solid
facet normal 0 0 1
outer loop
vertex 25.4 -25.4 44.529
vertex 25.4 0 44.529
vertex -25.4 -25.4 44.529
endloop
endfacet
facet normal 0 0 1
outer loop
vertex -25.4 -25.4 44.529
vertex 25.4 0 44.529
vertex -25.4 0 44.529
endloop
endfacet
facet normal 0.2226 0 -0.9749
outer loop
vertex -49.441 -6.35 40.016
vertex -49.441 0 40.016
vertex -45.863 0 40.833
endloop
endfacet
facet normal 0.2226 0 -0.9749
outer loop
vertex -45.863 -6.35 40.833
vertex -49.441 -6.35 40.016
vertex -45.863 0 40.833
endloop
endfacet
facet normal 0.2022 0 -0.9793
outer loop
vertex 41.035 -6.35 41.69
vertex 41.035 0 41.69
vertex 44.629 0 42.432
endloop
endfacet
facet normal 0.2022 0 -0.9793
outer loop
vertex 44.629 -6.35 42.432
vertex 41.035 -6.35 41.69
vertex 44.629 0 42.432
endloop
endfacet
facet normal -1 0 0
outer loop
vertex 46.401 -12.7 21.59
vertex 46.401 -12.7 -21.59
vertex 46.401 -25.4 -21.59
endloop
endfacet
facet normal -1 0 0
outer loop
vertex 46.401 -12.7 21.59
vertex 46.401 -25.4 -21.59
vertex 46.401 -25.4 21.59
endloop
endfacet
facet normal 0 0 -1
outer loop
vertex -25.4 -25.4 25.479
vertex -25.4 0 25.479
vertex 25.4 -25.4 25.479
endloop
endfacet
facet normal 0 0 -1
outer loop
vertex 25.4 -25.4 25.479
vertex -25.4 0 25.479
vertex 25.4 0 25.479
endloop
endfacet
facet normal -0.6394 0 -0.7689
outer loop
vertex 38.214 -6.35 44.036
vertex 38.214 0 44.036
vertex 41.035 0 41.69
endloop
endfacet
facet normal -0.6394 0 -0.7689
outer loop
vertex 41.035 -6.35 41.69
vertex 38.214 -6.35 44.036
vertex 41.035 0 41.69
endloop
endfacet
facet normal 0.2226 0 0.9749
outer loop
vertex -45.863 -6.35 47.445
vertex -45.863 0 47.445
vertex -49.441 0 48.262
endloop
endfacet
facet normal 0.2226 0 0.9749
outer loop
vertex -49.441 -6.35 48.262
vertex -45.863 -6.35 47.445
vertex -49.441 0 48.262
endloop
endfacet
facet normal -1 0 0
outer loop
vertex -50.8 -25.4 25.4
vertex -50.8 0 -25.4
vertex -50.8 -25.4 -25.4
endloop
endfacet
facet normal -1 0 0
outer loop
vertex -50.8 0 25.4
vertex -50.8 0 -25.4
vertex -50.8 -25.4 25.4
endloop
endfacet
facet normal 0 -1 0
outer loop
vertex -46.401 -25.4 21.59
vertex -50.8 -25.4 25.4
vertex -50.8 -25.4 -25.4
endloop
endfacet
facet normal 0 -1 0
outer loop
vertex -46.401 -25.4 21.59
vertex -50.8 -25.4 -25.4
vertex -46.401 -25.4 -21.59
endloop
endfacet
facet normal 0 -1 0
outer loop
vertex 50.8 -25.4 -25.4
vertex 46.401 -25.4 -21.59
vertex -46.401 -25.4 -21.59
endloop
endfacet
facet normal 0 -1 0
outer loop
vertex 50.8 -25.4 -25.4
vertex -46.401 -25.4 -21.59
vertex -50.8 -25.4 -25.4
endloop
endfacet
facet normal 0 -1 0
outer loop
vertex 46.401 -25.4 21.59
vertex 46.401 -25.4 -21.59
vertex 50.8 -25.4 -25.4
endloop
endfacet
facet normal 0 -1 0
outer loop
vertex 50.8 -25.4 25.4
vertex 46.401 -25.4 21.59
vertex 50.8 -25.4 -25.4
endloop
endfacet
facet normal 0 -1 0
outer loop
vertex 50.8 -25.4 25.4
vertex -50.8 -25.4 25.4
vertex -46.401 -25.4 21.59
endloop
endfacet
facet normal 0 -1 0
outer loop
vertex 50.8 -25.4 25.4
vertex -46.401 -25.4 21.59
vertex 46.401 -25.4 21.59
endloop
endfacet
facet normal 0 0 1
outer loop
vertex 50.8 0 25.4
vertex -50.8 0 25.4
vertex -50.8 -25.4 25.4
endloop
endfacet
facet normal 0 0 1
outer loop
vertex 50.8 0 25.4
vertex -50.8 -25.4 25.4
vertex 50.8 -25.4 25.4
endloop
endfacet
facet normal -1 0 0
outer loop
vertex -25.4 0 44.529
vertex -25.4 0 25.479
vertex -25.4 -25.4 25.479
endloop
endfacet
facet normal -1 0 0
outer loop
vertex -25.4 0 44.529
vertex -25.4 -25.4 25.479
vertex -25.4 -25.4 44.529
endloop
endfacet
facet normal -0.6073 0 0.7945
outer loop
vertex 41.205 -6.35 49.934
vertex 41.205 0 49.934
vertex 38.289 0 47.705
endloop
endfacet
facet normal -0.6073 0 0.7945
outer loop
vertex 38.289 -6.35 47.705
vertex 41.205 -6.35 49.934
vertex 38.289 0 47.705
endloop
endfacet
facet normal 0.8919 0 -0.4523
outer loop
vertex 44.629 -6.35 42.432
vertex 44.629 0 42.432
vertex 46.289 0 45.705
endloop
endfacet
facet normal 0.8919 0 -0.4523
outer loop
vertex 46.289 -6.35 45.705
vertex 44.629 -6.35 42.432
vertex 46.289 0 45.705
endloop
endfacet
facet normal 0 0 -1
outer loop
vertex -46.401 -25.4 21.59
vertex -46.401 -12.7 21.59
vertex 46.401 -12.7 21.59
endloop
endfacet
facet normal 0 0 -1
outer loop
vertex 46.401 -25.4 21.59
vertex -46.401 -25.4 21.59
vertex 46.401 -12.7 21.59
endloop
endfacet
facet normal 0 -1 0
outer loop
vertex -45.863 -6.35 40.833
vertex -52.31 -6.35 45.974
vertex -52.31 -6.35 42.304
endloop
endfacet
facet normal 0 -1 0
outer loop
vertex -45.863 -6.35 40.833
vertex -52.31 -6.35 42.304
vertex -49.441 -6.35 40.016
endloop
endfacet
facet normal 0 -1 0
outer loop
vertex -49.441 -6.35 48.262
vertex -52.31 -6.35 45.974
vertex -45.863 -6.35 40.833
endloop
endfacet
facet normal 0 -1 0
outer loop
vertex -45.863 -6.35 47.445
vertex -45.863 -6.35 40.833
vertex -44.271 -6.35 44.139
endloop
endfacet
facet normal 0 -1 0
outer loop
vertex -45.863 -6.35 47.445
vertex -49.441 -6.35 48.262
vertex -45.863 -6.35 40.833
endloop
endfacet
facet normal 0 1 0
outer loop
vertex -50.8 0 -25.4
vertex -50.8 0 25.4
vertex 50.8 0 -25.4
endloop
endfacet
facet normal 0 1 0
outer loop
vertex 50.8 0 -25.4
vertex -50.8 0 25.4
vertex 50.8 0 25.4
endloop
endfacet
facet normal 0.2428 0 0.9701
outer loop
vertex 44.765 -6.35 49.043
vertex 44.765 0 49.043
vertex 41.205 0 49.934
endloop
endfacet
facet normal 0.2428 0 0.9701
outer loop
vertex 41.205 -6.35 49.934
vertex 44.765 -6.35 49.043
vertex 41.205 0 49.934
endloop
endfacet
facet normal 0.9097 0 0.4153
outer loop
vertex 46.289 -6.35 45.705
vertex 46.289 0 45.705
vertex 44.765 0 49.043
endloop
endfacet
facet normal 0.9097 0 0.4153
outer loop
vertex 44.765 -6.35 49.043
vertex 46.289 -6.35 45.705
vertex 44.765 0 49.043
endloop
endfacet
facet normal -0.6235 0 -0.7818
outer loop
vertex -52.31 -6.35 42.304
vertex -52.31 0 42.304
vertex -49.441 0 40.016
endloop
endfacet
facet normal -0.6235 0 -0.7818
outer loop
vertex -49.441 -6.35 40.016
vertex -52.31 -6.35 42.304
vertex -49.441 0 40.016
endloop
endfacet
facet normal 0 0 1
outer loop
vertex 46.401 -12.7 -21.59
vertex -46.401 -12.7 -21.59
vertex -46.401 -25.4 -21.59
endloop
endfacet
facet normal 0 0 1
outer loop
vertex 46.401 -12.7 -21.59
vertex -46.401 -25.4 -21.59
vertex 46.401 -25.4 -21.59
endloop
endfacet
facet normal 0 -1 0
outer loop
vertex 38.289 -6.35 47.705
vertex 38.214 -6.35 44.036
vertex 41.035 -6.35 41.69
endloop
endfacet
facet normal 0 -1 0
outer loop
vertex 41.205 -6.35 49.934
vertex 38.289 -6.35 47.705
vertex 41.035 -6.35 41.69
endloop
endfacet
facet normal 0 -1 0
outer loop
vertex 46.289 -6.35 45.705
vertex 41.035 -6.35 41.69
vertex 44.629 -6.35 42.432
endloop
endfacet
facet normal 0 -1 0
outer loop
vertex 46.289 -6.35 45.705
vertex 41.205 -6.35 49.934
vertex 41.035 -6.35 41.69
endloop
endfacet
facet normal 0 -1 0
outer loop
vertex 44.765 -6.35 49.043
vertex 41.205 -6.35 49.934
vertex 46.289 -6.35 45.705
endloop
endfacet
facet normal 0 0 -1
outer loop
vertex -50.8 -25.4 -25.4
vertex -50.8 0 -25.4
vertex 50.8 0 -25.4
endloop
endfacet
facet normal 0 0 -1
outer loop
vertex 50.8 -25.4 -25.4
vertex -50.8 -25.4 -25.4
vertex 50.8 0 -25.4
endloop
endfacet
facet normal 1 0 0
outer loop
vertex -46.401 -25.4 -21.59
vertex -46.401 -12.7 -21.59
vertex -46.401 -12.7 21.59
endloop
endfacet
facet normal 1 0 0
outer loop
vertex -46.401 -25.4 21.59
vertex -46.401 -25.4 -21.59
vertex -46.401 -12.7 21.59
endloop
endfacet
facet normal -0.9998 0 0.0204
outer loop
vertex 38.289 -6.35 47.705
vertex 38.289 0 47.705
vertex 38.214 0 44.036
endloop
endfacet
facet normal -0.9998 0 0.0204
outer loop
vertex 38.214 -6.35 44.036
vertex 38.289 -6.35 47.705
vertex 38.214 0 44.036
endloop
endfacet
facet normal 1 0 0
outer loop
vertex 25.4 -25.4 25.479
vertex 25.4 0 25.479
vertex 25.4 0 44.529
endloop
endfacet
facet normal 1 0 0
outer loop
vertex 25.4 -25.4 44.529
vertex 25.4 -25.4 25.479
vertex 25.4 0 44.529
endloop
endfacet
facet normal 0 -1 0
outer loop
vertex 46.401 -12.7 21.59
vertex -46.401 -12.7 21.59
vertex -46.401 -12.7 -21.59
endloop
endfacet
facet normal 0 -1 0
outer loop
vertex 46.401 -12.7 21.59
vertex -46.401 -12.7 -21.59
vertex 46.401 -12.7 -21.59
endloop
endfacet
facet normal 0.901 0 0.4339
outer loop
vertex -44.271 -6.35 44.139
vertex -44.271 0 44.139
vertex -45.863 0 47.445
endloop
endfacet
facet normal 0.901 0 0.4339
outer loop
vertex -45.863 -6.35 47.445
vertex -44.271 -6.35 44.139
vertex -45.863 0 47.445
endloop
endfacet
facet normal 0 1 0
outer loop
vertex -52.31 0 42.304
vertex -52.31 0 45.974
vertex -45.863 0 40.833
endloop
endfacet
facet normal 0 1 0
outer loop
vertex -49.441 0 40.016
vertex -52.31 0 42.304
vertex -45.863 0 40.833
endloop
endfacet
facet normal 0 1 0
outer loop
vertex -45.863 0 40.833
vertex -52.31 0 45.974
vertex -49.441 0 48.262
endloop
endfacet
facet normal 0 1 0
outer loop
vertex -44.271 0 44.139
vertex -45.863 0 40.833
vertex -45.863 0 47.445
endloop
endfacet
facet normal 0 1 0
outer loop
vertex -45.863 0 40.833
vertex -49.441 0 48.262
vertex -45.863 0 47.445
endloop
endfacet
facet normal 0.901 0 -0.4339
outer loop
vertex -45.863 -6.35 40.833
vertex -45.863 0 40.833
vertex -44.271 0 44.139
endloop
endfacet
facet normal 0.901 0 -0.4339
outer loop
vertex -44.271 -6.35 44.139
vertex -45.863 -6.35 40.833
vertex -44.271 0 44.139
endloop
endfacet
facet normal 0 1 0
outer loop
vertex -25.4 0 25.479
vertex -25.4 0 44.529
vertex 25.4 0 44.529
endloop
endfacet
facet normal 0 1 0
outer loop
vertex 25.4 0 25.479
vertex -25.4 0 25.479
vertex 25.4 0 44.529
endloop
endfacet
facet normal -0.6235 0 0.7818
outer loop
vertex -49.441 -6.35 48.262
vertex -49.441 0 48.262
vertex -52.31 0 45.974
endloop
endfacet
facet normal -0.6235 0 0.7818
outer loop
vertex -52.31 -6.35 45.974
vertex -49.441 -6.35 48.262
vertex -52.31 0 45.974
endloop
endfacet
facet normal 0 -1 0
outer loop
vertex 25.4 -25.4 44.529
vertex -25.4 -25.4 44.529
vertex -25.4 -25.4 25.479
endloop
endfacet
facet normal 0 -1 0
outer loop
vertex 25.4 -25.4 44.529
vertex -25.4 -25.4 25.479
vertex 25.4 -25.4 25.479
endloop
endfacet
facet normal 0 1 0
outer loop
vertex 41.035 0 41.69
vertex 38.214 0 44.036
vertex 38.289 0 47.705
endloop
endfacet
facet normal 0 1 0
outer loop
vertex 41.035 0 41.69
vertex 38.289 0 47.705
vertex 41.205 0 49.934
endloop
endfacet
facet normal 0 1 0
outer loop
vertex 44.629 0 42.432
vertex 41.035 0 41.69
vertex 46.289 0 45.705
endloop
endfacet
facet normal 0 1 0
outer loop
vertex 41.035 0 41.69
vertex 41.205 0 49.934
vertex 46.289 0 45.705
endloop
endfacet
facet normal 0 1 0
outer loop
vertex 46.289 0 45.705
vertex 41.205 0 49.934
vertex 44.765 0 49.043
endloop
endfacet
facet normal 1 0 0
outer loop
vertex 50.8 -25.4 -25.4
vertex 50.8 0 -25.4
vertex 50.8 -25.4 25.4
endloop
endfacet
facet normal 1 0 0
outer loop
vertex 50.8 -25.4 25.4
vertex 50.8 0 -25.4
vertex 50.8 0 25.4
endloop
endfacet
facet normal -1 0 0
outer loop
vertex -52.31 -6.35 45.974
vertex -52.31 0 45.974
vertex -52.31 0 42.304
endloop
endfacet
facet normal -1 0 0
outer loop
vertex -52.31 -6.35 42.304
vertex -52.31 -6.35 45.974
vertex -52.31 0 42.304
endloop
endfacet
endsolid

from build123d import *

# Parameters (mm, degrees)
F0_W     = 92.80128
F0_H     = 43.18
F1_DEPTH = 12.7
F0_W_2   = 101.6
F0_H_2   = 50.8
F0_W_3   = 25.4
F0_H_3   = 19.05
F2_DEPTH = 25.4
F5_DEPTH = 6.35


with BuildPart() as f1:
    # F0 (on Front) → F1 (new body)
    with BuildSketch(Plane.XZ):
        Rectangle(F0_W, F0_H)
    extrude(amount=F1_DEPTH)

    # F0 (on Front) → F2 (join)
    with BuildSketch(Plane.XZ):
        Rectangle(F0_W_2, F0_H_2)
        Rectangle(F0_W, F0_H, mode=Mode.SUBTRACT)
        with Locations((-12.7, 35.003949)):
            Rectangle(F0_W_3, F0_H_3)
        with Locations((12.7, 35.003949)):
            Rectangle(F0_W_3, F0_H_3)
    extrude(amount=F2_DEPTH)


with BuildPart() as f5:
    # F4 (on Front) → F5 (new body)
    with BuildSketch(Plane.XZ):
        Polygon((-52.309997, 45.973995), (-52.309997, 42.304396), (-49.44099, 40.016439), (-45.863396, 40.833002), (-44.271216, 44.139196), (-45.863396, 47.44539), (-49.44099, 48.261952), align=None)
        Polygon((38.213673, 44.036436), (41.034899, 41.689814), (44.628568, 42.432441), (46.288574, 45.705106), (44.764899, 49.043424), (41.204901, 49.933574), (38.289331, 47.705255), align=None)
    extrude(amount=F5_DEPTH)


solid = Compound([f1.part, f5.part])
